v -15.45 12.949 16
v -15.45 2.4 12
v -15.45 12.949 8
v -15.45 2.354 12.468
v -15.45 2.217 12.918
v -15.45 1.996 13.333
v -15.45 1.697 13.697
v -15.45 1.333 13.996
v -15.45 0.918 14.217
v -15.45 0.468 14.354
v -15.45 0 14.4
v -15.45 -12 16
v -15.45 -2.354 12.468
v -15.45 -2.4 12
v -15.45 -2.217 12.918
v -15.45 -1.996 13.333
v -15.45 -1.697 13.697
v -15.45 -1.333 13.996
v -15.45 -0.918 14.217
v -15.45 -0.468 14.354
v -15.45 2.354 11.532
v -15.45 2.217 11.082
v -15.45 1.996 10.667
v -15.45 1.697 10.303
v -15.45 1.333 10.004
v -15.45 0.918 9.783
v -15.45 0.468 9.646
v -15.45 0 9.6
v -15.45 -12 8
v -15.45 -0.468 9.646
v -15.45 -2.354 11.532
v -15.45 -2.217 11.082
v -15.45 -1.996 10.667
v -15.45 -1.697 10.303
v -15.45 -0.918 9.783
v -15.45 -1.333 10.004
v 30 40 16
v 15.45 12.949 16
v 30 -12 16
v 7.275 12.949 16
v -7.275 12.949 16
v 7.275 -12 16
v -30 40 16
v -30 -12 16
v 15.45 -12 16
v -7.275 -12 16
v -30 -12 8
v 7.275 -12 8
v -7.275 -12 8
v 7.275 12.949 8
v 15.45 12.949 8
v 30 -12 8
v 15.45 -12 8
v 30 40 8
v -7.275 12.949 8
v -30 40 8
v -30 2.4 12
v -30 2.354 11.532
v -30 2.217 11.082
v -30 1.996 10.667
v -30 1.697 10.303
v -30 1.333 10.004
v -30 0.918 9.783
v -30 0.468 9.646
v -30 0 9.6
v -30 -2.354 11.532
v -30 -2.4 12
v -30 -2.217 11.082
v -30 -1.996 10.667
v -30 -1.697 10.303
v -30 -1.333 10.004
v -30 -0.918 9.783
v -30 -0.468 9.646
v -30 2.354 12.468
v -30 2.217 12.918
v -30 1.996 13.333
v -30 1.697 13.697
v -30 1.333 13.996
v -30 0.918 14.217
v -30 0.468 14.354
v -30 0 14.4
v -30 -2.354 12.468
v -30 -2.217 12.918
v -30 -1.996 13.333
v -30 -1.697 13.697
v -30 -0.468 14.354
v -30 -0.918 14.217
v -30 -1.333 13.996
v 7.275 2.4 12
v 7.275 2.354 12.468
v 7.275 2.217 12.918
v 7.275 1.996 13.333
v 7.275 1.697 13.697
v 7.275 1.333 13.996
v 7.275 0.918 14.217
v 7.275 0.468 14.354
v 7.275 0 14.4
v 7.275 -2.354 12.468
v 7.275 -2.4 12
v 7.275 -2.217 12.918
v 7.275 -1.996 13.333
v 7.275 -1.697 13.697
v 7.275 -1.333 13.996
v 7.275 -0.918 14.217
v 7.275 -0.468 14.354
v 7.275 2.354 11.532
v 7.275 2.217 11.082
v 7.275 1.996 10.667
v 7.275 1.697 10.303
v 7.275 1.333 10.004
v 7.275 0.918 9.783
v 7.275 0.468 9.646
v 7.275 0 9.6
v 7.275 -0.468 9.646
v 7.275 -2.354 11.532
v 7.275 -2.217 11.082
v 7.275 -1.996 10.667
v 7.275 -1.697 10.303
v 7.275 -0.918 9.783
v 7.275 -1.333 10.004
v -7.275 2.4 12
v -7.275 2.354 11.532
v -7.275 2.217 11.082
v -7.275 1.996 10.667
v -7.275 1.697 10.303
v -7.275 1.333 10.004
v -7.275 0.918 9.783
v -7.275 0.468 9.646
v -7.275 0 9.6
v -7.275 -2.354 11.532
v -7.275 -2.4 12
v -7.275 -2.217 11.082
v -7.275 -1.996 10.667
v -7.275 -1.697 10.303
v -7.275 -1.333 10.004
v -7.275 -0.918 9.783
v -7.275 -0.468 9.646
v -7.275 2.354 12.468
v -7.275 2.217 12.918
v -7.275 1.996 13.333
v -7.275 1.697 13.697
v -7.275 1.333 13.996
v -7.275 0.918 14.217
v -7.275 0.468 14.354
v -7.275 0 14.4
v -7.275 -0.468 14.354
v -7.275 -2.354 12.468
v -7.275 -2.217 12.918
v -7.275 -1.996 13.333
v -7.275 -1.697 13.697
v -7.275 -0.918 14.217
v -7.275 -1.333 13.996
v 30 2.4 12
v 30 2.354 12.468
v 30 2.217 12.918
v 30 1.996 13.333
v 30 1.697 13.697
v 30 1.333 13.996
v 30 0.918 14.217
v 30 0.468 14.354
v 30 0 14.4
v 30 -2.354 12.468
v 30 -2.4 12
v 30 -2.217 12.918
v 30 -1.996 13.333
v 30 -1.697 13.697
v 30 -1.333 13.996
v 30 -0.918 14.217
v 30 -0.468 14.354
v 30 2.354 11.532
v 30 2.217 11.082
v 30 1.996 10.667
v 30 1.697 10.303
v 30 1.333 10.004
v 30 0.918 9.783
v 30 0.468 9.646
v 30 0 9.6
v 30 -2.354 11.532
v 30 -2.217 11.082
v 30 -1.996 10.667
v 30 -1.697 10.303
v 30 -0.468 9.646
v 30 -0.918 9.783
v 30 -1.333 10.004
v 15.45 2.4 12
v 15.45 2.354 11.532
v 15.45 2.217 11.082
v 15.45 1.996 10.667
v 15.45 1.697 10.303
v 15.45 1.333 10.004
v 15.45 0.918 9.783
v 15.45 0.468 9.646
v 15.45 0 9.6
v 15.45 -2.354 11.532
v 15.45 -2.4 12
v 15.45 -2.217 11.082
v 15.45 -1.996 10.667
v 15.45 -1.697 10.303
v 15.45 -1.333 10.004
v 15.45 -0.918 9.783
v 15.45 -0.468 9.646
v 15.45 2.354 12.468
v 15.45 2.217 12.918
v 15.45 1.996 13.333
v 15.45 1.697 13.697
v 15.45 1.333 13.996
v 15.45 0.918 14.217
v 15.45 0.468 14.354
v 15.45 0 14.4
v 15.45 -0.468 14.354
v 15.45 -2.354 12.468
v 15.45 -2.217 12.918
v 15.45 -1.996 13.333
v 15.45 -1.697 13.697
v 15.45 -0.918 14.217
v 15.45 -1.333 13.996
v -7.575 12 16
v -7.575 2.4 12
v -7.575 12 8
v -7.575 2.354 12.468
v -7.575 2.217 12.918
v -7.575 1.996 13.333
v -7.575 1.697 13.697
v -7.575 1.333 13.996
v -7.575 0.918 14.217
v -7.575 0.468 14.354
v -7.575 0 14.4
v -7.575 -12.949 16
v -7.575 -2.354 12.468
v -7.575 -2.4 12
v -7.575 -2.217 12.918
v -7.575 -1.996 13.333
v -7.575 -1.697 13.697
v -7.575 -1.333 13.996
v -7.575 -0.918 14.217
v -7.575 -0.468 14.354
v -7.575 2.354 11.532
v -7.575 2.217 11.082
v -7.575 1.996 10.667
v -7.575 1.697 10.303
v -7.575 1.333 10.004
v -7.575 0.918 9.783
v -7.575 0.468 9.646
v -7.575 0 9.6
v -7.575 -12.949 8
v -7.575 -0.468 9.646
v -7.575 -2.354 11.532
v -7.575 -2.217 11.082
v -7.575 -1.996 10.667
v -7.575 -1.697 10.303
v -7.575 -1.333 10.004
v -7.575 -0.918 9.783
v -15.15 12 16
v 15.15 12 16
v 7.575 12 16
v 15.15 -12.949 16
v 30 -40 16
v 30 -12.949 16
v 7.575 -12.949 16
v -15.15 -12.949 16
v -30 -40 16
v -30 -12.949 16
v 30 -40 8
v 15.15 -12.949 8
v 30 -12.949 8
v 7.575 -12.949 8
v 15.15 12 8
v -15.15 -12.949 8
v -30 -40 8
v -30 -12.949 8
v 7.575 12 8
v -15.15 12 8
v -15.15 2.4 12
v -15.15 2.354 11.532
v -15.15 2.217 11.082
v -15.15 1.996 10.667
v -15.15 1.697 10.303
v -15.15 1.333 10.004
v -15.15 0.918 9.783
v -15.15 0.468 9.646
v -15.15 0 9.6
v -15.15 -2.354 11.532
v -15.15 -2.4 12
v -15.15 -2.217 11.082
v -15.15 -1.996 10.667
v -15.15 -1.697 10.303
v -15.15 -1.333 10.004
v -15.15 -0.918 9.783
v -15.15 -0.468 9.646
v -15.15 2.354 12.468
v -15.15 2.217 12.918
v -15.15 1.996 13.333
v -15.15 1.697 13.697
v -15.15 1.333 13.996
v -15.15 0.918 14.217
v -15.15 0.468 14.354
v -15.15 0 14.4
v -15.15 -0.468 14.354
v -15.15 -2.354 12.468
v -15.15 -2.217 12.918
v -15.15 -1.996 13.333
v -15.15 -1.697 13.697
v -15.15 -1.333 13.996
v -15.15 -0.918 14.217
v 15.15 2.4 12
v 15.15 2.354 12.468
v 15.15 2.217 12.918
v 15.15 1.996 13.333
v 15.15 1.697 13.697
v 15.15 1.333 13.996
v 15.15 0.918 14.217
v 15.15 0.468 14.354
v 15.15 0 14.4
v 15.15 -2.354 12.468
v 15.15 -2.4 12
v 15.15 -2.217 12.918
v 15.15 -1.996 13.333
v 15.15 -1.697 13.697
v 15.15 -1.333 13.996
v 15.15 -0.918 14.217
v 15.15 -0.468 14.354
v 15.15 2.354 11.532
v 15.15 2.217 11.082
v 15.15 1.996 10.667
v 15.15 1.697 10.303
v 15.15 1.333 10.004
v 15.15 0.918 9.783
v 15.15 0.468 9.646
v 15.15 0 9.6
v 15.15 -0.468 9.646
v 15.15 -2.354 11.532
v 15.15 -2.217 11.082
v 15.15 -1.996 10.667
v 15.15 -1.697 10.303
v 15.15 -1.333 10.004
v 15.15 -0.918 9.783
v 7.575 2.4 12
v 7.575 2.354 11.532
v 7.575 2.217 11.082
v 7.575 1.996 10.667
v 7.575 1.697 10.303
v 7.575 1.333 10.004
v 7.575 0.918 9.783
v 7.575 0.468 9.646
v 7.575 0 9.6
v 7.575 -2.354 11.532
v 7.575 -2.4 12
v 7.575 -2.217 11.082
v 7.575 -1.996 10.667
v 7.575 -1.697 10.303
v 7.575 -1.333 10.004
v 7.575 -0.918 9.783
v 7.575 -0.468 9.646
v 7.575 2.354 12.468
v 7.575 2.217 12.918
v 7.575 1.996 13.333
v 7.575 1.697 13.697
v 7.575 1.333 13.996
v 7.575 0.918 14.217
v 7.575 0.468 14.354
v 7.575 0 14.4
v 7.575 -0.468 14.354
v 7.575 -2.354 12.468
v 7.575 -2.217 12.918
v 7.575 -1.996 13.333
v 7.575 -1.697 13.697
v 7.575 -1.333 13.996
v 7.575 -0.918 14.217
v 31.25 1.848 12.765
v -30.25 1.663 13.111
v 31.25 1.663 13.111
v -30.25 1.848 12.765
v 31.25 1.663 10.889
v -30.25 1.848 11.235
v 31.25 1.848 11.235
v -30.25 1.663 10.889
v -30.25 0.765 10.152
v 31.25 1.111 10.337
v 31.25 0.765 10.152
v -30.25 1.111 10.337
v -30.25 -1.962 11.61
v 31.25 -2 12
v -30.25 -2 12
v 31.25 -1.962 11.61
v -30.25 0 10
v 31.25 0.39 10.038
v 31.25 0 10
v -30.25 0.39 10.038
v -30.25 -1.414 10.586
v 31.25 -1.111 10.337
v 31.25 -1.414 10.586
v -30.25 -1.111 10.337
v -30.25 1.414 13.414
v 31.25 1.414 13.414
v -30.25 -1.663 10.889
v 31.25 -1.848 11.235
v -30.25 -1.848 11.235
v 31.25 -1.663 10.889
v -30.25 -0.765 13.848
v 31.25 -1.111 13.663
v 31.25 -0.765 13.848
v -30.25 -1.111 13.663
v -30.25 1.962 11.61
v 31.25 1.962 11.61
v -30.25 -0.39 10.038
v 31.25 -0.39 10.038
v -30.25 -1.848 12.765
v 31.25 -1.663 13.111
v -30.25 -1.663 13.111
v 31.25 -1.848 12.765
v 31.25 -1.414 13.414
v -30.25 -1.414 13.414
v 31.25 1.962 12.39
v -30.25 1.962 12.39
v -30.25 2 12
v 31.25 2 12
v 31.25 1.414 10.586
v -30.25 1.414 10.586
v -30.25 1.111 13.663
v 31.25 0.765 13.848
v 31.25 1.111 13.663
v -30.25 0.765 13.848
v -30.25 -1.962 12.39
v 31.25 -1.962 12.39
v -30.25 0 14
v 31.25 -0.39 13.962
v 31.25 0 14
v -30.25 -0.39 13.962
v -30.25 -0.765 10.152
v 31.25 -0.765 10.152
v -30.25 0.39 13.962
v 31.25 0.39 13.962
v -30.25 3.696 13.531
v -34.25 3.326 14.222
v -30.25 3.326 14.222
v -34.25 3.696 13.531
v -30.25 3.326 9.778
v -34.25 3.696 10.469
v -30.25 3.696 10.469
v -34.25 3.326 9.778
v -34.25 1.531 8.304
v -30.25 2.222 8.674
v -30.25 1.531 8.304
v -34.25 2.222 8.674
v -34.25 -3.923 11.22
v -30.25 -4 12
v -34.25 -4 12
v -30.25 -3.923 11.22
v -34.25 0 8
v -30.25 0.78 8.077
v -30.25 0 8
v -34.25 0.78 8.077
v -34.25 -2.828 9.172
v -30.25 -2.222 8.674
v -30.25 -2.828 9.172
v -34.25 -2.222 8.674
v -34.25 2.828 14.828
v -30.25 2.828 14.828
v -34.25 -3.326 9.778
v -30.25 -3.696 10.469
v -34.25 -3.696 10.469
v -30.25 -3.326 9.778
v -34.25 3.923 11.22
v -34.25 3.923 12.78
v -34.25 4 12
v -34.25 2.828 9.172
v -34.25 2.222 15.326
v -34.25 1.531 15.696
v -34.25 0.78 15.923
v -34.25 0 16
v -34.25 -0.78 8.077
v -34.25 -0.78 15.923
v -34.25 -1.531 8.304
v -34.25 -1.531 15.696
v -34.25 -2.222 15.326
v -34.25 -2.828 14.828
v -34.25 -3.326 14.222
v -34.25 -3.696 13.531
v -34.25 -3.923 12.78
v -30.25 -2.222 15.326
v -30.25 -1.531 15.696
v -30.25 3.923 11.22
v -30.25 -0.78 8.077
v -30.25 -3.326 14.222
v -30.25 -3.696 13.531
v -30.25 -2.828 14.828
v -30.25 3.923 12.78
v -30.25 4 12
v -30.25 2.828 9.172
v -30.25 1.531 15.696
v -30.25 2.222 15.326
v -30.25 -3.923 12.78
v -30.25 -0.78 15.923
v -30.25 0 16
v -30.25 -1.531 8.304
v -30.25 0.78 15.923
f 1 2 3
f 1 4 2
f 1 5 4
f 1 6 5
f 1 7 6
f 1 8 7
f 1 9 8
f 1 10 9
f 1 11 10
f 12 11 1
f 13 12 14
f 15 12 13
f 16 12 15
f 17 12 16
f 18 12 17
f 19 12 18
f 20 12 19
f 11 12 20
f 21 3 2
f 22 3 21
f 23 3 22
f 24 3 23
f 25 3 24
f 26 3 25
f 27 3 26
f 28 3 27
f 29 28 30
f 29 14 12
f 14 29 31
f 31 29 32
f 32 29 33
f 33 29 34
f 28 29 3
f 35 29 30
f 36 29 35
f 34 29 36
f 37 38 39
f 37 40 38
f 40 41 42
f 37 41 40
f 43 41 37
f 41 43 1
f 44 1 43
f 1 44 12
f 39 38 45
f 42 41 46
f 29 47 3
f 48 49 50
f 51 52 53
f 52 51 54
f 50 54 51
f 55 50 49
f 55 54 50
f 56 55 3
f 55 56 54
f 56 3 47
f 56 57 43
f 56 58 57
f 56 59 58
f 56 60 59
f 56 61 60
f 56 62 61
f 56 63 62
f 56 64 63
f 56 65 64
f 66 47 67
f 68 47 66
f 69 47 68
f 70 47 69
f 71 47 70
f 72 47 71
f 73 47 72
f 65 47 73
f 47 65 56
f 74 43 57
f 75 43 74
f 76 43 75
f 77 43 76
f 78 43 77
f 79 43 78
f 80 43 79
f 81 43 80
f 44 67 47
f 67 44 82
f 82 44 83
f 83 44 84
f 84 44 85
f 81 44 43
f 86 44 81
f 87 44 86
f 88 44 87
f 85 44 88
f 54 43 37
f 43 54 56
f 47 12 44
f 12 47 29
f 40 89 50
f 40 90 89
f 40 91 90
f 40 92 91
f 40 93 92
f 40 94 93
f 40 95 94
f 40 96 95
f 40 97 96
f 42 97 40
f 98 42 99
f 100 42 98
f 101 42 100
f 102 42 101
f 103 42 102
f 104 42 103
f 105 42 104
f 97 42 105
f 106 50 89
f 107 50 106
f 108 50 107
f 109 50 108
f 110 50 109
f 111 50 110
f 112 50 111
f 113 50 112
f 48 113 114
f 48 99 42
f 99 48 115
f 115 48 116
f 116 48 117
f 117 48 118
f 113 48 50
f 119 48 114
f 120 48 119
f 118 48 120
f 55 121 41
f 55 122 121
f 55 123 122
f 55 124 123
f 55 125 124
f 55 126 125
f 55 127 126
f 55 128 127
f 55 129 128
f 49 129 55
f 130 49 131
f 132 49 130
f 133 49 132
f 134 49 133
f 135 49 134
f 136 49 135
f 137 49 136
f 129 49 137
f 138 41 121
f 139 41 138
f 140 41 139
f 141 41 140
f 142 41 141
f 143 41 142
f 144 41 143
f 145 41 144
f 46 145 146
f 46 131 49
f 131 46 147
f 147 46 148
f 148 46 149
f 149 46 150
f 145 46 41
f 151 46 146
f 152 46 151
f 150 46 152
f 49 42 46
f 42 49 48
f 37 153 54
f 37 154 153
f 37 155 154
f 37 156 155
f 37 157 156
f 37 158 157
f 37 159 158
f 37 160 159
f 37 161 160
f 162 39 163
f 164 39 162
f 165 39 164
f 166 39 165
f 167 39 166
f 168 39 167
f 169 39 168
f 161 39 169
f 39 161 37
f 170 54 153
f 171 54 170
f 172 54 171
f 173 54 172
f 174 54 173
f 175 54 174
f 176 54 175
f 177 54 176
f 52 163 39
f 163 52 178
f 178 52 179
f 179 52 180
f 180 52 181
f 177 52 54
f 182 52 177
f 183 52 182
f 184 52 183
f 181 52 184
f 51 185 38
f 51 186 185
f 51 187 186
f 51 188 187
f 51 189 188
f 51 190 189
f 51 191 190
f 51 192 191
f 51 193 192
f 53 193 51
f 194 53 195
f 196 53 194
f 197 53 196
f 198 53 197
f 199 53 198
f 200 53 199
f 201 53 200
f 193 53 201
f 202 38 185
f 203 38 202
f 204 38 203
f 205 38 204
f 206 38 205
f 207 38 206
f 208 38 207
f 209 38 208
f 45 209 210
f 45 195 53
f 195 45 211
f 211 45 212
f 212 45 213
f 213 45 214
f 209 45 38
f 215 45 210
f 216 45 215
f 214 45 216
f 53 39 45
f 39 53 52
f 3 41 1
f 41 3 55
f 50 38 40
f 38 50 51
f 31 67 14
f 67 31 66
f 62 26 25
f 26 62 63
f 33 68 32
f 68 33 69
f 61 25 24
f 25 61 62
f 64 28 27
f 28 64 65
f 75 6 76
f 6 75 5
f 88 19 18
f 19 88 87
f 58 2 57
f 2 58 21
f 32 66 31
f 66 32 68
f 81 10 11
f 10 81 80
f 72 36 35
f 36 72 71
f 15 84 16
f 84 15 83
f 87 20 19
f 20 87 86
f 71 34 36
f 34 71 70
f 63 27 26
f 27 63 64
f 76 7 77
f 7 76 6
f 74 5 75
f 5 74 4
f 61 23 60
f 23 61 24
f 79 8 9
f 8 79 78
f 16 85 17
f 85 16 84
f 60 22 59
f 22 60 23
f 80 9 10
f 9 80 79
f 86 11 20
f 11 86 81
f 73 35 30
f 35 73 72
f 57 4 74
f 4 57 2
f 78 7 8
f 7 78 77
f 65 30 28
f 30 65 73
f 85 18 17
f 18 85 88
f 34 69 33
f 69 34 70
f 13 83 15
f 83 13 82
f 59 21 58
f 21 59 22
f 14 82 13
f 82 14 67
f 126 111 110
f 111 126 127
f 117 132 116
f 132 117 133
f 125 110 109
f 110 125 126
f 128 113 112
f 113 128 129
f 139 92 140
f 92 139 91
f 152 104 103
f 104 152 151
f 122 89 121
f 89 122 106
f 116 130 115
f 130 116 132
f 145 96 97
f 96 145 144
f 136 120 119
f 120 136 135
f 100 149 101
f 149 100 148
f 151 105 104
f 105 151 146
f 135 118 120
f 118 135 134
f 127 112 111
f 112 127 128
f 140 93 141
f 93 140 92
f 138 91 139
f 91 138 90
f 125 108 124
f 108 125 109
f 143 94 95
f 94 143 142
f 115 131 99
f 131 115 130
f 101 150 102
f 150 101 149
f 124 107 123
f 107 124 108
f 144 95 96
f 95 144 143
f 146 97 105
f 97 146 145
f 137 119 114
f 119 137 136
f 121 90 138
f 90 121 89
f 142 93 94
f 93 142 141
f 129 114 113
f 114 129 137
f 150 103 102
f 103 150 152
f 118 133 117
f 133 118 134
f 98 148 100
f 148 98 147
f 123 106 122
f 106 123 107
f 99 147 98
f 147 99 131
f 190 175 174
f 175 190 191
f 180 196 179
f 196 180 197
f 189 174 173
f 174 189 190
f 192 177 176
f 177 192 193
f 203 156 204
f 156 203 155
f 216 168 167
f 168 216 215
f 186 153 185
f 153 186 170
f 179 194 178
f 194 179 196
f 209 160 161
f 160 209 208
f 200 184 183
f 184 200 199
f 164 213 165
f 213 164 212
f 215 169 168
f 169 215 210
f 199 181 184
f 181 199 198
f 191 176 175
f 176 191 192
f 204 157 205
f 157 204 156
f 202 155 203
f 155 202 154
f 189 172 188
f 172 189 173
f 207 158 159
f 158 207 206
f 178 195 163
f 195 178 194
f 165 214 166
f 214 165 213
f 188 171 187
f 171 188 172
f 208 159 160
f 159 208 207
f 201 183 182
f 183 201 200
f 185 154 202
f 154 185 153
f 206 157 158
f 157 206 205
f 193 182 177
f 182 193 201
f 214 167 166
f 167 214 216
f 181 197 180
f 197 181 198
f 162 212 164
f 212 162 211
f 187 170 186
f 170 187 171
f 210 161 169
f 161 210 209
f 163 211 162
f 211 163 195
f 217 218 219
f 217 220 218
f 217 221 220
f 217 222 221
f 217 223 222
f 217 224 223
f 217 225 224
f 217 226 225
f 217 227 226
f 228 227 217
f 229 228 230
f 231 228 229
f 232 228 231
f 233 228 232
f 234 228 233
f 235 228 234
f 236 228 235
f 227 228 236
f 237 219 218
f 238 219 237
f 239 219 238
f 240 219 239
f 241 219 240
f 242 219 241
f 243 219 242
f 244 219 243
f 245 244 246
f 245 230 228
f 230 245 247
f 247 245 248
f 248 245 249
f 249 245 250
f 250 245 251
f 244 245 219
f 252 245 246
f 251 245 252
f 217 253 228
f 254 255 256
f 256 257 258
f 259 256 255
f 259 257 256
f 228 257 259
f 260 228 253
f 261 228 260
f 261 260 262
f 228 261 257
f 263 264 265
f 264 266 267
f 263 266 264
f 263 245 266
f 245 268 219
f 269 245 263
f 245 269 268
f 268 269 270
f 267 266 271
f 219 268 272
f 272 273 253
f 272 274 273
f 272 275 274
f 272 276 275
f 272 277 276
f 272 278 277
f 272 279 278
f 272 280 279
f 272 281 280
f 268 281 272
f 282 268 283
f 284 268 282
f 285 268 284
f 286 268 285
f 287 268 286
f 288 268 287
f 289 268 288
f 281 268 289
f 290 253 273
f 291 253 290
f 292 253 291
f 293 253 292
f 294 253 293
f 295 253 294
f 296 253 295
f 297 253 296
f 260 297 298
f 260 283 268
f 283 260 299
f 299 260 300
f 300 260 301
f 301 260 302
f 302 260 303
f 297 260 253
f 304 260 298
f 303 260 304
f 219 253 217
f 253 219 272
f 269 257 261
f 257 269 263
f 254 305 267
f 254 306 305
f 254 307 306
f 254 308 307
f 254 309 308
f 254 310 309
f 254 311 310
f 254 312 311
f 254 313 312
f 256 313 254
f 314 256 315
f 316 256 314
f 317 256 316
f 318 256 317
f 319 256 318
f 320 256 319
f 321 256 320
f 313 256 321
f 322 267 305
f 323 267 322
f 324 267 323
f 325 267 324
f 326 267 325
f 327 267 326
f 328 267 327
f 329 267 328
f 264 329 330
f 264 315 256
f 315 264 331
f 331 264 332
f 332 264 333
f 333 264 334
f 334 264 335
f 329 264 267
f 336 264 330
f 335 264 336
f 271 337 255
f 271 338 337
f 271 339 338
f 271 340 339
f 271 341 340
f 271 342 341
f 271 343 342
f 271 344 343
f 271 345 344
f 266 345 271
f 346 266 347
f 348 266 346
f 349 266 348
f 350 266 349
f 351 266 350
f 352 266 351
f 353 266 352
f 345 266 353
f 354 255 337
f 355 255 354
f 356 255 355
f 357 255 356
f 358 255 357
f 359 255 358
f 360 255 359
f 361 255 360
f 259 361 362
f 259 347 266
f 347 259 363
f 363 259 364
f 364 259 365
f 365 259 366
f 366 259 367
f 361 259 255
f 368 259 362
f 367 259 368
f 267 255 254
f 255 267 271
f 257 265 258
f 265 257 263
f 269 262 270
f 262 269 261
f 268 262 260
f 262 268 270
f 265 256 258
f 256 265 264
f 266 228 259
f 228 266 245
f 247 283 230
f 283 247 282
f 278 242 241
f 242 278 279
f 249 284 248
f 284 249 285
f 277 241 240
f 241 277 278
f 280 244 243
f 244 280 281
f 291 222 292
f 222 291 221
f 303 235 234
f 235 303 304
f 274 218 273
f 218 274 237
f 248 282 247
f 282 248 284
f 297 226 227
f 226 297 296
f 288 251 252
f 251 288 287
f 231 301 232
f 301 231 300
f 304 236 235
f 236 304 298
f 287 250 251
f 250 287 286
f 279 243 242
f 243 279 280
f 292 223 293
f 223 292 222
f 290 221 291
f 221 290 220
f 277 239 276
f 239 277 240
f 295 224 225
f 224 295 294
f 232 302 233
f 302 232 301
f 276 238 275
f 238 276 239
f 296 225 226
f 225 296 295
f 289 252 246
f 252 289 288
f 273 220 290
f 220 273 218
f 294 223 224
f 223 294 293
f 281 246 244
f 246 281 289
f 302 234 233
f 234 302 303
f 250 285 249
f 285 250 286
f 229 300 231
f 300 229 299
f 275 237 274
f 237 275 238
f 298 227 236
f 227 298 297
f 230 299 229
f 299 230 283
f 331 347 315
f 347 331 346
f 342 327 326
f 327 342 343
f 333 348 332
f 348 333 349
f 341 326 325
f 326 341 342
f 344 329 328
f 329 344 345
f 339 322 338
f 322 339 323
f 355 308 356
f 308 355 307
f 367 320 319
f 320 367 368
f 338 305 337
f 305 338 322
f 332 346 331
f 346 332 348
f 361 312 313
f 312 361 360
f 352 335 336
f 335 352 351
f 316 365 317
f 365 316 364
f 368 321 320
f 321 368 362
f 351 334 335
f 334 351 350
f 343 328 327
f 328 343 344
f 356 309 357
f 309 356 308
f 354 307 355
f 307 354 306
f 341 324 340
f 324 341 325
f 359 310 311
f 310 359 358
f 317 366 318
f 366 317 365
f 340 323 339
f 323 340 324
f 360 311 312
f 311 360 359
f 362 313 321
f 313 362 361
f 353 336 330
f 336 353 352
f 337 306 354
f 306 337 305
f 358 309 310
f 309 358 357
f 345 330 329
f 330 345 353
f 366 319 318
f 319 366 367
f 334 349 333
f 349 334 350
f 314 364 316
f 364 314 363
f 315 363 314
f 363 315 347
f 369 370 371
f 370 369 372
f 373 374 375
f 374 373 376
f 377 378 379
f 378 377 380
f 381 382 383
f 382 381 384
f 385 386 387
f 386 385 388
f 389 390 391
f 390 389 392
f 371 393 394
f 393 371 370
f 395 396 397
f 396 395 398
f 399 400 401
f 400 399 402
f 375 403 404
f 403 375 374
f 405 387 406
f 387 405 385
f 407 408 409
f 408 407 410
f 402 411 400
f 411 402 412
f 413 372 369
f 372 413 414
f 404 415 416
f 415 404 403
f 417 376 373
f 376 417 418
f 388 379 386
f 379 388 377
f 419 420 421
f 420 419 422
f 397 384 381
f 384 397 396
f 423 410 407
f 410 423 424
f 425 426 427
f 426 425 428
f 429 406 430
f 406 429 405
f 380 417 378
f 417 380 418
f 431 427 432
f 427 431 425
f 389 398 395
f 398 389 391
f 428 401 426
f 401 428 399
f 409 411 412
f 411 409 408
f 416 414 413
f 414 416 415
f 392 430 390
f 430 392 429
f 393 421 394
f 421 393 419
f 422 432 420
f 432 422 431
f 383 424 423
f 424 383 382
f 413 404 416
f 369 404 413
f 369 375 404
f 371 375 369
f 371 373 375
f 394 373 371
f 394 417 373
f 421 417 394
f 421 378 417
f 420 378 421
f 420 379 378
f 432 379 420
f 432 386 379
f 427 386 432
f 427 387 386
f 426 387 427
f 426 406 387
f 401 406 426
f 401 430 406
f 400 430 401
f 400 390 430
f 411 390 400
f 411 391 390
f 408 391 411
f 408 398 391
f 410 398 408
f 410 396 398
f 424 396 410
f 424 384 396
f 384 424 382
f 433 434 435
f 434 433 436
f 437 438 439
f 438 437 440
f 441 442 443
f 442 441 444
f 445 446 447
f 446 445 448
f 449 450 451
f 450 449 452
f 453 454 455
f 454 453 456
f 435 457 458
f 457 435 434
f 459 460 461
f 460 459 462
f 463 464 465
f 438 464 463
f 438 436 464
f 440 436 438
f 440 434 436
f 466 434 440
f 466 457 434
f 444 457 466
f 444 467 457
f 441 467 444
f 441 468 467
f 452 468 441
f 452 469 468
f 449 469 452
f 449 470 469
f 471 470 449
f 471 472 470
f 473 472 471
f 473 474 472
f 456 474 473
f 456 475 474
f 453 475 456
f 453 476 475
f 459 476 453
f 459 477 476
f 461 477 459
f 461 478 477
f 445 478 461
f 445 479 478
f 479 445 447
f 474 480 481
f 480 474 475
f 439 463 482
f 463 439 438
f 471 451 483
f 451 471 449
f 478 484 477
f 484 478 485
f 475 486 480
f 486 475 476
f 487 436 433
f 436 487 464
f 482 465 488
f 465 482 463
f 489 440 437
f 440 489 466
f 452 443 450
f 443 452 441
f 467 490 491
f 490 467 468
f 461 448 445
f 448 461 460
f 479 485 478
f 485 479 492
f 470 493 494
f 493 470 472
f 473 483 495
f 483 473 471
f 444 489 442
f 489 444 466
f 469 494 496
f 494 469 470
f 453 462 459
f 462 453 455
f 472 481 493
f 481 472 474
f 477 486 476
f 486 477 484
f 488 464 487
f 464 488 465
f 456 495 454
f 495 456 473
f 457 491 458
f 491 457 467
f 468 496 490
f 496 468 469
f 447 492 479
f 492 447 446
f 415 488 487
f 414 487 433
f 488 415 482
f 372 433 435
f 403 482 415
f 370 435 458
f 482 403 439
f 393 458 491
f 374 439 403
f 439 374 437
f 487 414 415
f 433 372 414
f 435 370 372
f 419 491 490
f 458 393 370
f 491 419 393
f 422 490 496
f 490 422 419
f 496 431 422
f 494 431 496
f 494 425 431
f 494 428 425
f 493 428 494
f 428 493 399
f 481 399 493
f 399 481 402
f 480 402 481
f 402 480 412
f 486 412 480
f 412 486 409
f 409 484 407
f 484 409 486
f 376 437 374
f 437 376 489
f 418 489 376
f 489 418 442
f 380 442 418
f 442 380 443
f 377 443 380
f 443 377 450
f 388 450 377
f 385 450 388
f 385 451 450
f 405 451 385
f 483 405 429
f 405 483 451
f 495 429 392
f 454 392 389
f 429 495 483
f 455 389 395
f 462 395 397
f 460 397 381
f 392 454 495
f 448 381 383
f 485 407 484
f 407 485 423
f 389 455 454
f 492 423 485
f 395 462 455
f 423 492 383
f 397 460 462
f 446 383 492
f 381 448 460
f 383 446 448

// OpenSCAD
$fn = 32;

// ------------------------------------------------------------------------
// Butt hinge: hinge 60 mm, leaf swung 0 deg
// Every part is its own module, assembly() places every instance.
// ------------------------------------------------------------------------

// --- part 1 ---
module hinge_base() {
  difference() {
    union() {
      translate([-30, -12, -4]) cube([14.55, 52, 8]);
      translate([-7.275, -12, -4]) cube([14.55, 52, 8]);
      translate([15.45, -12, -4]) cube([14.55, 52, 8]);
      translate([-30, 12.949, -4]) cube([60, 27.051, 8]);
    }
    translate([-22.725, 0, 0]) rotate([0, 90, 0]) cylinder(h = 16.55, d = 4.8, center = true);
    translate([0, 0, 0]) rotate([0, 90, 0]) cylinder(h = 16.55, d = 4.8, center = true);
    translate([22.725, 0, 0]) rotate([0, 90, 0]) cylinder(h = 16.55, d = 4.8, center = true);
  }
}

// --- part 2 ---
module hinge_mover() {
  difference() {
    union() {
      translate([-15.15, -40, -4]) cube([7.575, 52, 8]);
      translate([7.575, -40, -4]) cube([7.575, 52, 8]);
      translate([-30, -40, -4]) cube([60, 27.051, 8]);
    }
    translate([-11.362, 0, 0]) rotate([0, 90, 0]) cylinder(h = 9.575, d = 4.8, center = true);
    translate([11.362, 0, 0]) rotate([0, 90, 0]) cylinder(h = 9.575, d = 4.8, center = true);
  }
}

// --- part 3 ---
module hinge_pin() {
  rotate([0, 90, 0]) cylinder(h = 62.5, d = 4, center = true);
  translate([-34.25, 0, 0]) rotate([0, 90, 0]) cylinder(h = 4, d = 8);
}

// --- assembly ---
module assembly() {
  color([0.80, 0.24, 0.20]) translate([0, 0, 12]) rotate([0, 0, 0]) hinge_base();
  color([0.20, 0.45, 0.75]) translate([0, 0, 12]) rotate([0, 0, 0]) hinge_mover();
  color([0.25, 0.62, 0.32]) translate([0, 0, 12]) rotate([0, 0, 0]) hinge_pin();
}

assembly();
